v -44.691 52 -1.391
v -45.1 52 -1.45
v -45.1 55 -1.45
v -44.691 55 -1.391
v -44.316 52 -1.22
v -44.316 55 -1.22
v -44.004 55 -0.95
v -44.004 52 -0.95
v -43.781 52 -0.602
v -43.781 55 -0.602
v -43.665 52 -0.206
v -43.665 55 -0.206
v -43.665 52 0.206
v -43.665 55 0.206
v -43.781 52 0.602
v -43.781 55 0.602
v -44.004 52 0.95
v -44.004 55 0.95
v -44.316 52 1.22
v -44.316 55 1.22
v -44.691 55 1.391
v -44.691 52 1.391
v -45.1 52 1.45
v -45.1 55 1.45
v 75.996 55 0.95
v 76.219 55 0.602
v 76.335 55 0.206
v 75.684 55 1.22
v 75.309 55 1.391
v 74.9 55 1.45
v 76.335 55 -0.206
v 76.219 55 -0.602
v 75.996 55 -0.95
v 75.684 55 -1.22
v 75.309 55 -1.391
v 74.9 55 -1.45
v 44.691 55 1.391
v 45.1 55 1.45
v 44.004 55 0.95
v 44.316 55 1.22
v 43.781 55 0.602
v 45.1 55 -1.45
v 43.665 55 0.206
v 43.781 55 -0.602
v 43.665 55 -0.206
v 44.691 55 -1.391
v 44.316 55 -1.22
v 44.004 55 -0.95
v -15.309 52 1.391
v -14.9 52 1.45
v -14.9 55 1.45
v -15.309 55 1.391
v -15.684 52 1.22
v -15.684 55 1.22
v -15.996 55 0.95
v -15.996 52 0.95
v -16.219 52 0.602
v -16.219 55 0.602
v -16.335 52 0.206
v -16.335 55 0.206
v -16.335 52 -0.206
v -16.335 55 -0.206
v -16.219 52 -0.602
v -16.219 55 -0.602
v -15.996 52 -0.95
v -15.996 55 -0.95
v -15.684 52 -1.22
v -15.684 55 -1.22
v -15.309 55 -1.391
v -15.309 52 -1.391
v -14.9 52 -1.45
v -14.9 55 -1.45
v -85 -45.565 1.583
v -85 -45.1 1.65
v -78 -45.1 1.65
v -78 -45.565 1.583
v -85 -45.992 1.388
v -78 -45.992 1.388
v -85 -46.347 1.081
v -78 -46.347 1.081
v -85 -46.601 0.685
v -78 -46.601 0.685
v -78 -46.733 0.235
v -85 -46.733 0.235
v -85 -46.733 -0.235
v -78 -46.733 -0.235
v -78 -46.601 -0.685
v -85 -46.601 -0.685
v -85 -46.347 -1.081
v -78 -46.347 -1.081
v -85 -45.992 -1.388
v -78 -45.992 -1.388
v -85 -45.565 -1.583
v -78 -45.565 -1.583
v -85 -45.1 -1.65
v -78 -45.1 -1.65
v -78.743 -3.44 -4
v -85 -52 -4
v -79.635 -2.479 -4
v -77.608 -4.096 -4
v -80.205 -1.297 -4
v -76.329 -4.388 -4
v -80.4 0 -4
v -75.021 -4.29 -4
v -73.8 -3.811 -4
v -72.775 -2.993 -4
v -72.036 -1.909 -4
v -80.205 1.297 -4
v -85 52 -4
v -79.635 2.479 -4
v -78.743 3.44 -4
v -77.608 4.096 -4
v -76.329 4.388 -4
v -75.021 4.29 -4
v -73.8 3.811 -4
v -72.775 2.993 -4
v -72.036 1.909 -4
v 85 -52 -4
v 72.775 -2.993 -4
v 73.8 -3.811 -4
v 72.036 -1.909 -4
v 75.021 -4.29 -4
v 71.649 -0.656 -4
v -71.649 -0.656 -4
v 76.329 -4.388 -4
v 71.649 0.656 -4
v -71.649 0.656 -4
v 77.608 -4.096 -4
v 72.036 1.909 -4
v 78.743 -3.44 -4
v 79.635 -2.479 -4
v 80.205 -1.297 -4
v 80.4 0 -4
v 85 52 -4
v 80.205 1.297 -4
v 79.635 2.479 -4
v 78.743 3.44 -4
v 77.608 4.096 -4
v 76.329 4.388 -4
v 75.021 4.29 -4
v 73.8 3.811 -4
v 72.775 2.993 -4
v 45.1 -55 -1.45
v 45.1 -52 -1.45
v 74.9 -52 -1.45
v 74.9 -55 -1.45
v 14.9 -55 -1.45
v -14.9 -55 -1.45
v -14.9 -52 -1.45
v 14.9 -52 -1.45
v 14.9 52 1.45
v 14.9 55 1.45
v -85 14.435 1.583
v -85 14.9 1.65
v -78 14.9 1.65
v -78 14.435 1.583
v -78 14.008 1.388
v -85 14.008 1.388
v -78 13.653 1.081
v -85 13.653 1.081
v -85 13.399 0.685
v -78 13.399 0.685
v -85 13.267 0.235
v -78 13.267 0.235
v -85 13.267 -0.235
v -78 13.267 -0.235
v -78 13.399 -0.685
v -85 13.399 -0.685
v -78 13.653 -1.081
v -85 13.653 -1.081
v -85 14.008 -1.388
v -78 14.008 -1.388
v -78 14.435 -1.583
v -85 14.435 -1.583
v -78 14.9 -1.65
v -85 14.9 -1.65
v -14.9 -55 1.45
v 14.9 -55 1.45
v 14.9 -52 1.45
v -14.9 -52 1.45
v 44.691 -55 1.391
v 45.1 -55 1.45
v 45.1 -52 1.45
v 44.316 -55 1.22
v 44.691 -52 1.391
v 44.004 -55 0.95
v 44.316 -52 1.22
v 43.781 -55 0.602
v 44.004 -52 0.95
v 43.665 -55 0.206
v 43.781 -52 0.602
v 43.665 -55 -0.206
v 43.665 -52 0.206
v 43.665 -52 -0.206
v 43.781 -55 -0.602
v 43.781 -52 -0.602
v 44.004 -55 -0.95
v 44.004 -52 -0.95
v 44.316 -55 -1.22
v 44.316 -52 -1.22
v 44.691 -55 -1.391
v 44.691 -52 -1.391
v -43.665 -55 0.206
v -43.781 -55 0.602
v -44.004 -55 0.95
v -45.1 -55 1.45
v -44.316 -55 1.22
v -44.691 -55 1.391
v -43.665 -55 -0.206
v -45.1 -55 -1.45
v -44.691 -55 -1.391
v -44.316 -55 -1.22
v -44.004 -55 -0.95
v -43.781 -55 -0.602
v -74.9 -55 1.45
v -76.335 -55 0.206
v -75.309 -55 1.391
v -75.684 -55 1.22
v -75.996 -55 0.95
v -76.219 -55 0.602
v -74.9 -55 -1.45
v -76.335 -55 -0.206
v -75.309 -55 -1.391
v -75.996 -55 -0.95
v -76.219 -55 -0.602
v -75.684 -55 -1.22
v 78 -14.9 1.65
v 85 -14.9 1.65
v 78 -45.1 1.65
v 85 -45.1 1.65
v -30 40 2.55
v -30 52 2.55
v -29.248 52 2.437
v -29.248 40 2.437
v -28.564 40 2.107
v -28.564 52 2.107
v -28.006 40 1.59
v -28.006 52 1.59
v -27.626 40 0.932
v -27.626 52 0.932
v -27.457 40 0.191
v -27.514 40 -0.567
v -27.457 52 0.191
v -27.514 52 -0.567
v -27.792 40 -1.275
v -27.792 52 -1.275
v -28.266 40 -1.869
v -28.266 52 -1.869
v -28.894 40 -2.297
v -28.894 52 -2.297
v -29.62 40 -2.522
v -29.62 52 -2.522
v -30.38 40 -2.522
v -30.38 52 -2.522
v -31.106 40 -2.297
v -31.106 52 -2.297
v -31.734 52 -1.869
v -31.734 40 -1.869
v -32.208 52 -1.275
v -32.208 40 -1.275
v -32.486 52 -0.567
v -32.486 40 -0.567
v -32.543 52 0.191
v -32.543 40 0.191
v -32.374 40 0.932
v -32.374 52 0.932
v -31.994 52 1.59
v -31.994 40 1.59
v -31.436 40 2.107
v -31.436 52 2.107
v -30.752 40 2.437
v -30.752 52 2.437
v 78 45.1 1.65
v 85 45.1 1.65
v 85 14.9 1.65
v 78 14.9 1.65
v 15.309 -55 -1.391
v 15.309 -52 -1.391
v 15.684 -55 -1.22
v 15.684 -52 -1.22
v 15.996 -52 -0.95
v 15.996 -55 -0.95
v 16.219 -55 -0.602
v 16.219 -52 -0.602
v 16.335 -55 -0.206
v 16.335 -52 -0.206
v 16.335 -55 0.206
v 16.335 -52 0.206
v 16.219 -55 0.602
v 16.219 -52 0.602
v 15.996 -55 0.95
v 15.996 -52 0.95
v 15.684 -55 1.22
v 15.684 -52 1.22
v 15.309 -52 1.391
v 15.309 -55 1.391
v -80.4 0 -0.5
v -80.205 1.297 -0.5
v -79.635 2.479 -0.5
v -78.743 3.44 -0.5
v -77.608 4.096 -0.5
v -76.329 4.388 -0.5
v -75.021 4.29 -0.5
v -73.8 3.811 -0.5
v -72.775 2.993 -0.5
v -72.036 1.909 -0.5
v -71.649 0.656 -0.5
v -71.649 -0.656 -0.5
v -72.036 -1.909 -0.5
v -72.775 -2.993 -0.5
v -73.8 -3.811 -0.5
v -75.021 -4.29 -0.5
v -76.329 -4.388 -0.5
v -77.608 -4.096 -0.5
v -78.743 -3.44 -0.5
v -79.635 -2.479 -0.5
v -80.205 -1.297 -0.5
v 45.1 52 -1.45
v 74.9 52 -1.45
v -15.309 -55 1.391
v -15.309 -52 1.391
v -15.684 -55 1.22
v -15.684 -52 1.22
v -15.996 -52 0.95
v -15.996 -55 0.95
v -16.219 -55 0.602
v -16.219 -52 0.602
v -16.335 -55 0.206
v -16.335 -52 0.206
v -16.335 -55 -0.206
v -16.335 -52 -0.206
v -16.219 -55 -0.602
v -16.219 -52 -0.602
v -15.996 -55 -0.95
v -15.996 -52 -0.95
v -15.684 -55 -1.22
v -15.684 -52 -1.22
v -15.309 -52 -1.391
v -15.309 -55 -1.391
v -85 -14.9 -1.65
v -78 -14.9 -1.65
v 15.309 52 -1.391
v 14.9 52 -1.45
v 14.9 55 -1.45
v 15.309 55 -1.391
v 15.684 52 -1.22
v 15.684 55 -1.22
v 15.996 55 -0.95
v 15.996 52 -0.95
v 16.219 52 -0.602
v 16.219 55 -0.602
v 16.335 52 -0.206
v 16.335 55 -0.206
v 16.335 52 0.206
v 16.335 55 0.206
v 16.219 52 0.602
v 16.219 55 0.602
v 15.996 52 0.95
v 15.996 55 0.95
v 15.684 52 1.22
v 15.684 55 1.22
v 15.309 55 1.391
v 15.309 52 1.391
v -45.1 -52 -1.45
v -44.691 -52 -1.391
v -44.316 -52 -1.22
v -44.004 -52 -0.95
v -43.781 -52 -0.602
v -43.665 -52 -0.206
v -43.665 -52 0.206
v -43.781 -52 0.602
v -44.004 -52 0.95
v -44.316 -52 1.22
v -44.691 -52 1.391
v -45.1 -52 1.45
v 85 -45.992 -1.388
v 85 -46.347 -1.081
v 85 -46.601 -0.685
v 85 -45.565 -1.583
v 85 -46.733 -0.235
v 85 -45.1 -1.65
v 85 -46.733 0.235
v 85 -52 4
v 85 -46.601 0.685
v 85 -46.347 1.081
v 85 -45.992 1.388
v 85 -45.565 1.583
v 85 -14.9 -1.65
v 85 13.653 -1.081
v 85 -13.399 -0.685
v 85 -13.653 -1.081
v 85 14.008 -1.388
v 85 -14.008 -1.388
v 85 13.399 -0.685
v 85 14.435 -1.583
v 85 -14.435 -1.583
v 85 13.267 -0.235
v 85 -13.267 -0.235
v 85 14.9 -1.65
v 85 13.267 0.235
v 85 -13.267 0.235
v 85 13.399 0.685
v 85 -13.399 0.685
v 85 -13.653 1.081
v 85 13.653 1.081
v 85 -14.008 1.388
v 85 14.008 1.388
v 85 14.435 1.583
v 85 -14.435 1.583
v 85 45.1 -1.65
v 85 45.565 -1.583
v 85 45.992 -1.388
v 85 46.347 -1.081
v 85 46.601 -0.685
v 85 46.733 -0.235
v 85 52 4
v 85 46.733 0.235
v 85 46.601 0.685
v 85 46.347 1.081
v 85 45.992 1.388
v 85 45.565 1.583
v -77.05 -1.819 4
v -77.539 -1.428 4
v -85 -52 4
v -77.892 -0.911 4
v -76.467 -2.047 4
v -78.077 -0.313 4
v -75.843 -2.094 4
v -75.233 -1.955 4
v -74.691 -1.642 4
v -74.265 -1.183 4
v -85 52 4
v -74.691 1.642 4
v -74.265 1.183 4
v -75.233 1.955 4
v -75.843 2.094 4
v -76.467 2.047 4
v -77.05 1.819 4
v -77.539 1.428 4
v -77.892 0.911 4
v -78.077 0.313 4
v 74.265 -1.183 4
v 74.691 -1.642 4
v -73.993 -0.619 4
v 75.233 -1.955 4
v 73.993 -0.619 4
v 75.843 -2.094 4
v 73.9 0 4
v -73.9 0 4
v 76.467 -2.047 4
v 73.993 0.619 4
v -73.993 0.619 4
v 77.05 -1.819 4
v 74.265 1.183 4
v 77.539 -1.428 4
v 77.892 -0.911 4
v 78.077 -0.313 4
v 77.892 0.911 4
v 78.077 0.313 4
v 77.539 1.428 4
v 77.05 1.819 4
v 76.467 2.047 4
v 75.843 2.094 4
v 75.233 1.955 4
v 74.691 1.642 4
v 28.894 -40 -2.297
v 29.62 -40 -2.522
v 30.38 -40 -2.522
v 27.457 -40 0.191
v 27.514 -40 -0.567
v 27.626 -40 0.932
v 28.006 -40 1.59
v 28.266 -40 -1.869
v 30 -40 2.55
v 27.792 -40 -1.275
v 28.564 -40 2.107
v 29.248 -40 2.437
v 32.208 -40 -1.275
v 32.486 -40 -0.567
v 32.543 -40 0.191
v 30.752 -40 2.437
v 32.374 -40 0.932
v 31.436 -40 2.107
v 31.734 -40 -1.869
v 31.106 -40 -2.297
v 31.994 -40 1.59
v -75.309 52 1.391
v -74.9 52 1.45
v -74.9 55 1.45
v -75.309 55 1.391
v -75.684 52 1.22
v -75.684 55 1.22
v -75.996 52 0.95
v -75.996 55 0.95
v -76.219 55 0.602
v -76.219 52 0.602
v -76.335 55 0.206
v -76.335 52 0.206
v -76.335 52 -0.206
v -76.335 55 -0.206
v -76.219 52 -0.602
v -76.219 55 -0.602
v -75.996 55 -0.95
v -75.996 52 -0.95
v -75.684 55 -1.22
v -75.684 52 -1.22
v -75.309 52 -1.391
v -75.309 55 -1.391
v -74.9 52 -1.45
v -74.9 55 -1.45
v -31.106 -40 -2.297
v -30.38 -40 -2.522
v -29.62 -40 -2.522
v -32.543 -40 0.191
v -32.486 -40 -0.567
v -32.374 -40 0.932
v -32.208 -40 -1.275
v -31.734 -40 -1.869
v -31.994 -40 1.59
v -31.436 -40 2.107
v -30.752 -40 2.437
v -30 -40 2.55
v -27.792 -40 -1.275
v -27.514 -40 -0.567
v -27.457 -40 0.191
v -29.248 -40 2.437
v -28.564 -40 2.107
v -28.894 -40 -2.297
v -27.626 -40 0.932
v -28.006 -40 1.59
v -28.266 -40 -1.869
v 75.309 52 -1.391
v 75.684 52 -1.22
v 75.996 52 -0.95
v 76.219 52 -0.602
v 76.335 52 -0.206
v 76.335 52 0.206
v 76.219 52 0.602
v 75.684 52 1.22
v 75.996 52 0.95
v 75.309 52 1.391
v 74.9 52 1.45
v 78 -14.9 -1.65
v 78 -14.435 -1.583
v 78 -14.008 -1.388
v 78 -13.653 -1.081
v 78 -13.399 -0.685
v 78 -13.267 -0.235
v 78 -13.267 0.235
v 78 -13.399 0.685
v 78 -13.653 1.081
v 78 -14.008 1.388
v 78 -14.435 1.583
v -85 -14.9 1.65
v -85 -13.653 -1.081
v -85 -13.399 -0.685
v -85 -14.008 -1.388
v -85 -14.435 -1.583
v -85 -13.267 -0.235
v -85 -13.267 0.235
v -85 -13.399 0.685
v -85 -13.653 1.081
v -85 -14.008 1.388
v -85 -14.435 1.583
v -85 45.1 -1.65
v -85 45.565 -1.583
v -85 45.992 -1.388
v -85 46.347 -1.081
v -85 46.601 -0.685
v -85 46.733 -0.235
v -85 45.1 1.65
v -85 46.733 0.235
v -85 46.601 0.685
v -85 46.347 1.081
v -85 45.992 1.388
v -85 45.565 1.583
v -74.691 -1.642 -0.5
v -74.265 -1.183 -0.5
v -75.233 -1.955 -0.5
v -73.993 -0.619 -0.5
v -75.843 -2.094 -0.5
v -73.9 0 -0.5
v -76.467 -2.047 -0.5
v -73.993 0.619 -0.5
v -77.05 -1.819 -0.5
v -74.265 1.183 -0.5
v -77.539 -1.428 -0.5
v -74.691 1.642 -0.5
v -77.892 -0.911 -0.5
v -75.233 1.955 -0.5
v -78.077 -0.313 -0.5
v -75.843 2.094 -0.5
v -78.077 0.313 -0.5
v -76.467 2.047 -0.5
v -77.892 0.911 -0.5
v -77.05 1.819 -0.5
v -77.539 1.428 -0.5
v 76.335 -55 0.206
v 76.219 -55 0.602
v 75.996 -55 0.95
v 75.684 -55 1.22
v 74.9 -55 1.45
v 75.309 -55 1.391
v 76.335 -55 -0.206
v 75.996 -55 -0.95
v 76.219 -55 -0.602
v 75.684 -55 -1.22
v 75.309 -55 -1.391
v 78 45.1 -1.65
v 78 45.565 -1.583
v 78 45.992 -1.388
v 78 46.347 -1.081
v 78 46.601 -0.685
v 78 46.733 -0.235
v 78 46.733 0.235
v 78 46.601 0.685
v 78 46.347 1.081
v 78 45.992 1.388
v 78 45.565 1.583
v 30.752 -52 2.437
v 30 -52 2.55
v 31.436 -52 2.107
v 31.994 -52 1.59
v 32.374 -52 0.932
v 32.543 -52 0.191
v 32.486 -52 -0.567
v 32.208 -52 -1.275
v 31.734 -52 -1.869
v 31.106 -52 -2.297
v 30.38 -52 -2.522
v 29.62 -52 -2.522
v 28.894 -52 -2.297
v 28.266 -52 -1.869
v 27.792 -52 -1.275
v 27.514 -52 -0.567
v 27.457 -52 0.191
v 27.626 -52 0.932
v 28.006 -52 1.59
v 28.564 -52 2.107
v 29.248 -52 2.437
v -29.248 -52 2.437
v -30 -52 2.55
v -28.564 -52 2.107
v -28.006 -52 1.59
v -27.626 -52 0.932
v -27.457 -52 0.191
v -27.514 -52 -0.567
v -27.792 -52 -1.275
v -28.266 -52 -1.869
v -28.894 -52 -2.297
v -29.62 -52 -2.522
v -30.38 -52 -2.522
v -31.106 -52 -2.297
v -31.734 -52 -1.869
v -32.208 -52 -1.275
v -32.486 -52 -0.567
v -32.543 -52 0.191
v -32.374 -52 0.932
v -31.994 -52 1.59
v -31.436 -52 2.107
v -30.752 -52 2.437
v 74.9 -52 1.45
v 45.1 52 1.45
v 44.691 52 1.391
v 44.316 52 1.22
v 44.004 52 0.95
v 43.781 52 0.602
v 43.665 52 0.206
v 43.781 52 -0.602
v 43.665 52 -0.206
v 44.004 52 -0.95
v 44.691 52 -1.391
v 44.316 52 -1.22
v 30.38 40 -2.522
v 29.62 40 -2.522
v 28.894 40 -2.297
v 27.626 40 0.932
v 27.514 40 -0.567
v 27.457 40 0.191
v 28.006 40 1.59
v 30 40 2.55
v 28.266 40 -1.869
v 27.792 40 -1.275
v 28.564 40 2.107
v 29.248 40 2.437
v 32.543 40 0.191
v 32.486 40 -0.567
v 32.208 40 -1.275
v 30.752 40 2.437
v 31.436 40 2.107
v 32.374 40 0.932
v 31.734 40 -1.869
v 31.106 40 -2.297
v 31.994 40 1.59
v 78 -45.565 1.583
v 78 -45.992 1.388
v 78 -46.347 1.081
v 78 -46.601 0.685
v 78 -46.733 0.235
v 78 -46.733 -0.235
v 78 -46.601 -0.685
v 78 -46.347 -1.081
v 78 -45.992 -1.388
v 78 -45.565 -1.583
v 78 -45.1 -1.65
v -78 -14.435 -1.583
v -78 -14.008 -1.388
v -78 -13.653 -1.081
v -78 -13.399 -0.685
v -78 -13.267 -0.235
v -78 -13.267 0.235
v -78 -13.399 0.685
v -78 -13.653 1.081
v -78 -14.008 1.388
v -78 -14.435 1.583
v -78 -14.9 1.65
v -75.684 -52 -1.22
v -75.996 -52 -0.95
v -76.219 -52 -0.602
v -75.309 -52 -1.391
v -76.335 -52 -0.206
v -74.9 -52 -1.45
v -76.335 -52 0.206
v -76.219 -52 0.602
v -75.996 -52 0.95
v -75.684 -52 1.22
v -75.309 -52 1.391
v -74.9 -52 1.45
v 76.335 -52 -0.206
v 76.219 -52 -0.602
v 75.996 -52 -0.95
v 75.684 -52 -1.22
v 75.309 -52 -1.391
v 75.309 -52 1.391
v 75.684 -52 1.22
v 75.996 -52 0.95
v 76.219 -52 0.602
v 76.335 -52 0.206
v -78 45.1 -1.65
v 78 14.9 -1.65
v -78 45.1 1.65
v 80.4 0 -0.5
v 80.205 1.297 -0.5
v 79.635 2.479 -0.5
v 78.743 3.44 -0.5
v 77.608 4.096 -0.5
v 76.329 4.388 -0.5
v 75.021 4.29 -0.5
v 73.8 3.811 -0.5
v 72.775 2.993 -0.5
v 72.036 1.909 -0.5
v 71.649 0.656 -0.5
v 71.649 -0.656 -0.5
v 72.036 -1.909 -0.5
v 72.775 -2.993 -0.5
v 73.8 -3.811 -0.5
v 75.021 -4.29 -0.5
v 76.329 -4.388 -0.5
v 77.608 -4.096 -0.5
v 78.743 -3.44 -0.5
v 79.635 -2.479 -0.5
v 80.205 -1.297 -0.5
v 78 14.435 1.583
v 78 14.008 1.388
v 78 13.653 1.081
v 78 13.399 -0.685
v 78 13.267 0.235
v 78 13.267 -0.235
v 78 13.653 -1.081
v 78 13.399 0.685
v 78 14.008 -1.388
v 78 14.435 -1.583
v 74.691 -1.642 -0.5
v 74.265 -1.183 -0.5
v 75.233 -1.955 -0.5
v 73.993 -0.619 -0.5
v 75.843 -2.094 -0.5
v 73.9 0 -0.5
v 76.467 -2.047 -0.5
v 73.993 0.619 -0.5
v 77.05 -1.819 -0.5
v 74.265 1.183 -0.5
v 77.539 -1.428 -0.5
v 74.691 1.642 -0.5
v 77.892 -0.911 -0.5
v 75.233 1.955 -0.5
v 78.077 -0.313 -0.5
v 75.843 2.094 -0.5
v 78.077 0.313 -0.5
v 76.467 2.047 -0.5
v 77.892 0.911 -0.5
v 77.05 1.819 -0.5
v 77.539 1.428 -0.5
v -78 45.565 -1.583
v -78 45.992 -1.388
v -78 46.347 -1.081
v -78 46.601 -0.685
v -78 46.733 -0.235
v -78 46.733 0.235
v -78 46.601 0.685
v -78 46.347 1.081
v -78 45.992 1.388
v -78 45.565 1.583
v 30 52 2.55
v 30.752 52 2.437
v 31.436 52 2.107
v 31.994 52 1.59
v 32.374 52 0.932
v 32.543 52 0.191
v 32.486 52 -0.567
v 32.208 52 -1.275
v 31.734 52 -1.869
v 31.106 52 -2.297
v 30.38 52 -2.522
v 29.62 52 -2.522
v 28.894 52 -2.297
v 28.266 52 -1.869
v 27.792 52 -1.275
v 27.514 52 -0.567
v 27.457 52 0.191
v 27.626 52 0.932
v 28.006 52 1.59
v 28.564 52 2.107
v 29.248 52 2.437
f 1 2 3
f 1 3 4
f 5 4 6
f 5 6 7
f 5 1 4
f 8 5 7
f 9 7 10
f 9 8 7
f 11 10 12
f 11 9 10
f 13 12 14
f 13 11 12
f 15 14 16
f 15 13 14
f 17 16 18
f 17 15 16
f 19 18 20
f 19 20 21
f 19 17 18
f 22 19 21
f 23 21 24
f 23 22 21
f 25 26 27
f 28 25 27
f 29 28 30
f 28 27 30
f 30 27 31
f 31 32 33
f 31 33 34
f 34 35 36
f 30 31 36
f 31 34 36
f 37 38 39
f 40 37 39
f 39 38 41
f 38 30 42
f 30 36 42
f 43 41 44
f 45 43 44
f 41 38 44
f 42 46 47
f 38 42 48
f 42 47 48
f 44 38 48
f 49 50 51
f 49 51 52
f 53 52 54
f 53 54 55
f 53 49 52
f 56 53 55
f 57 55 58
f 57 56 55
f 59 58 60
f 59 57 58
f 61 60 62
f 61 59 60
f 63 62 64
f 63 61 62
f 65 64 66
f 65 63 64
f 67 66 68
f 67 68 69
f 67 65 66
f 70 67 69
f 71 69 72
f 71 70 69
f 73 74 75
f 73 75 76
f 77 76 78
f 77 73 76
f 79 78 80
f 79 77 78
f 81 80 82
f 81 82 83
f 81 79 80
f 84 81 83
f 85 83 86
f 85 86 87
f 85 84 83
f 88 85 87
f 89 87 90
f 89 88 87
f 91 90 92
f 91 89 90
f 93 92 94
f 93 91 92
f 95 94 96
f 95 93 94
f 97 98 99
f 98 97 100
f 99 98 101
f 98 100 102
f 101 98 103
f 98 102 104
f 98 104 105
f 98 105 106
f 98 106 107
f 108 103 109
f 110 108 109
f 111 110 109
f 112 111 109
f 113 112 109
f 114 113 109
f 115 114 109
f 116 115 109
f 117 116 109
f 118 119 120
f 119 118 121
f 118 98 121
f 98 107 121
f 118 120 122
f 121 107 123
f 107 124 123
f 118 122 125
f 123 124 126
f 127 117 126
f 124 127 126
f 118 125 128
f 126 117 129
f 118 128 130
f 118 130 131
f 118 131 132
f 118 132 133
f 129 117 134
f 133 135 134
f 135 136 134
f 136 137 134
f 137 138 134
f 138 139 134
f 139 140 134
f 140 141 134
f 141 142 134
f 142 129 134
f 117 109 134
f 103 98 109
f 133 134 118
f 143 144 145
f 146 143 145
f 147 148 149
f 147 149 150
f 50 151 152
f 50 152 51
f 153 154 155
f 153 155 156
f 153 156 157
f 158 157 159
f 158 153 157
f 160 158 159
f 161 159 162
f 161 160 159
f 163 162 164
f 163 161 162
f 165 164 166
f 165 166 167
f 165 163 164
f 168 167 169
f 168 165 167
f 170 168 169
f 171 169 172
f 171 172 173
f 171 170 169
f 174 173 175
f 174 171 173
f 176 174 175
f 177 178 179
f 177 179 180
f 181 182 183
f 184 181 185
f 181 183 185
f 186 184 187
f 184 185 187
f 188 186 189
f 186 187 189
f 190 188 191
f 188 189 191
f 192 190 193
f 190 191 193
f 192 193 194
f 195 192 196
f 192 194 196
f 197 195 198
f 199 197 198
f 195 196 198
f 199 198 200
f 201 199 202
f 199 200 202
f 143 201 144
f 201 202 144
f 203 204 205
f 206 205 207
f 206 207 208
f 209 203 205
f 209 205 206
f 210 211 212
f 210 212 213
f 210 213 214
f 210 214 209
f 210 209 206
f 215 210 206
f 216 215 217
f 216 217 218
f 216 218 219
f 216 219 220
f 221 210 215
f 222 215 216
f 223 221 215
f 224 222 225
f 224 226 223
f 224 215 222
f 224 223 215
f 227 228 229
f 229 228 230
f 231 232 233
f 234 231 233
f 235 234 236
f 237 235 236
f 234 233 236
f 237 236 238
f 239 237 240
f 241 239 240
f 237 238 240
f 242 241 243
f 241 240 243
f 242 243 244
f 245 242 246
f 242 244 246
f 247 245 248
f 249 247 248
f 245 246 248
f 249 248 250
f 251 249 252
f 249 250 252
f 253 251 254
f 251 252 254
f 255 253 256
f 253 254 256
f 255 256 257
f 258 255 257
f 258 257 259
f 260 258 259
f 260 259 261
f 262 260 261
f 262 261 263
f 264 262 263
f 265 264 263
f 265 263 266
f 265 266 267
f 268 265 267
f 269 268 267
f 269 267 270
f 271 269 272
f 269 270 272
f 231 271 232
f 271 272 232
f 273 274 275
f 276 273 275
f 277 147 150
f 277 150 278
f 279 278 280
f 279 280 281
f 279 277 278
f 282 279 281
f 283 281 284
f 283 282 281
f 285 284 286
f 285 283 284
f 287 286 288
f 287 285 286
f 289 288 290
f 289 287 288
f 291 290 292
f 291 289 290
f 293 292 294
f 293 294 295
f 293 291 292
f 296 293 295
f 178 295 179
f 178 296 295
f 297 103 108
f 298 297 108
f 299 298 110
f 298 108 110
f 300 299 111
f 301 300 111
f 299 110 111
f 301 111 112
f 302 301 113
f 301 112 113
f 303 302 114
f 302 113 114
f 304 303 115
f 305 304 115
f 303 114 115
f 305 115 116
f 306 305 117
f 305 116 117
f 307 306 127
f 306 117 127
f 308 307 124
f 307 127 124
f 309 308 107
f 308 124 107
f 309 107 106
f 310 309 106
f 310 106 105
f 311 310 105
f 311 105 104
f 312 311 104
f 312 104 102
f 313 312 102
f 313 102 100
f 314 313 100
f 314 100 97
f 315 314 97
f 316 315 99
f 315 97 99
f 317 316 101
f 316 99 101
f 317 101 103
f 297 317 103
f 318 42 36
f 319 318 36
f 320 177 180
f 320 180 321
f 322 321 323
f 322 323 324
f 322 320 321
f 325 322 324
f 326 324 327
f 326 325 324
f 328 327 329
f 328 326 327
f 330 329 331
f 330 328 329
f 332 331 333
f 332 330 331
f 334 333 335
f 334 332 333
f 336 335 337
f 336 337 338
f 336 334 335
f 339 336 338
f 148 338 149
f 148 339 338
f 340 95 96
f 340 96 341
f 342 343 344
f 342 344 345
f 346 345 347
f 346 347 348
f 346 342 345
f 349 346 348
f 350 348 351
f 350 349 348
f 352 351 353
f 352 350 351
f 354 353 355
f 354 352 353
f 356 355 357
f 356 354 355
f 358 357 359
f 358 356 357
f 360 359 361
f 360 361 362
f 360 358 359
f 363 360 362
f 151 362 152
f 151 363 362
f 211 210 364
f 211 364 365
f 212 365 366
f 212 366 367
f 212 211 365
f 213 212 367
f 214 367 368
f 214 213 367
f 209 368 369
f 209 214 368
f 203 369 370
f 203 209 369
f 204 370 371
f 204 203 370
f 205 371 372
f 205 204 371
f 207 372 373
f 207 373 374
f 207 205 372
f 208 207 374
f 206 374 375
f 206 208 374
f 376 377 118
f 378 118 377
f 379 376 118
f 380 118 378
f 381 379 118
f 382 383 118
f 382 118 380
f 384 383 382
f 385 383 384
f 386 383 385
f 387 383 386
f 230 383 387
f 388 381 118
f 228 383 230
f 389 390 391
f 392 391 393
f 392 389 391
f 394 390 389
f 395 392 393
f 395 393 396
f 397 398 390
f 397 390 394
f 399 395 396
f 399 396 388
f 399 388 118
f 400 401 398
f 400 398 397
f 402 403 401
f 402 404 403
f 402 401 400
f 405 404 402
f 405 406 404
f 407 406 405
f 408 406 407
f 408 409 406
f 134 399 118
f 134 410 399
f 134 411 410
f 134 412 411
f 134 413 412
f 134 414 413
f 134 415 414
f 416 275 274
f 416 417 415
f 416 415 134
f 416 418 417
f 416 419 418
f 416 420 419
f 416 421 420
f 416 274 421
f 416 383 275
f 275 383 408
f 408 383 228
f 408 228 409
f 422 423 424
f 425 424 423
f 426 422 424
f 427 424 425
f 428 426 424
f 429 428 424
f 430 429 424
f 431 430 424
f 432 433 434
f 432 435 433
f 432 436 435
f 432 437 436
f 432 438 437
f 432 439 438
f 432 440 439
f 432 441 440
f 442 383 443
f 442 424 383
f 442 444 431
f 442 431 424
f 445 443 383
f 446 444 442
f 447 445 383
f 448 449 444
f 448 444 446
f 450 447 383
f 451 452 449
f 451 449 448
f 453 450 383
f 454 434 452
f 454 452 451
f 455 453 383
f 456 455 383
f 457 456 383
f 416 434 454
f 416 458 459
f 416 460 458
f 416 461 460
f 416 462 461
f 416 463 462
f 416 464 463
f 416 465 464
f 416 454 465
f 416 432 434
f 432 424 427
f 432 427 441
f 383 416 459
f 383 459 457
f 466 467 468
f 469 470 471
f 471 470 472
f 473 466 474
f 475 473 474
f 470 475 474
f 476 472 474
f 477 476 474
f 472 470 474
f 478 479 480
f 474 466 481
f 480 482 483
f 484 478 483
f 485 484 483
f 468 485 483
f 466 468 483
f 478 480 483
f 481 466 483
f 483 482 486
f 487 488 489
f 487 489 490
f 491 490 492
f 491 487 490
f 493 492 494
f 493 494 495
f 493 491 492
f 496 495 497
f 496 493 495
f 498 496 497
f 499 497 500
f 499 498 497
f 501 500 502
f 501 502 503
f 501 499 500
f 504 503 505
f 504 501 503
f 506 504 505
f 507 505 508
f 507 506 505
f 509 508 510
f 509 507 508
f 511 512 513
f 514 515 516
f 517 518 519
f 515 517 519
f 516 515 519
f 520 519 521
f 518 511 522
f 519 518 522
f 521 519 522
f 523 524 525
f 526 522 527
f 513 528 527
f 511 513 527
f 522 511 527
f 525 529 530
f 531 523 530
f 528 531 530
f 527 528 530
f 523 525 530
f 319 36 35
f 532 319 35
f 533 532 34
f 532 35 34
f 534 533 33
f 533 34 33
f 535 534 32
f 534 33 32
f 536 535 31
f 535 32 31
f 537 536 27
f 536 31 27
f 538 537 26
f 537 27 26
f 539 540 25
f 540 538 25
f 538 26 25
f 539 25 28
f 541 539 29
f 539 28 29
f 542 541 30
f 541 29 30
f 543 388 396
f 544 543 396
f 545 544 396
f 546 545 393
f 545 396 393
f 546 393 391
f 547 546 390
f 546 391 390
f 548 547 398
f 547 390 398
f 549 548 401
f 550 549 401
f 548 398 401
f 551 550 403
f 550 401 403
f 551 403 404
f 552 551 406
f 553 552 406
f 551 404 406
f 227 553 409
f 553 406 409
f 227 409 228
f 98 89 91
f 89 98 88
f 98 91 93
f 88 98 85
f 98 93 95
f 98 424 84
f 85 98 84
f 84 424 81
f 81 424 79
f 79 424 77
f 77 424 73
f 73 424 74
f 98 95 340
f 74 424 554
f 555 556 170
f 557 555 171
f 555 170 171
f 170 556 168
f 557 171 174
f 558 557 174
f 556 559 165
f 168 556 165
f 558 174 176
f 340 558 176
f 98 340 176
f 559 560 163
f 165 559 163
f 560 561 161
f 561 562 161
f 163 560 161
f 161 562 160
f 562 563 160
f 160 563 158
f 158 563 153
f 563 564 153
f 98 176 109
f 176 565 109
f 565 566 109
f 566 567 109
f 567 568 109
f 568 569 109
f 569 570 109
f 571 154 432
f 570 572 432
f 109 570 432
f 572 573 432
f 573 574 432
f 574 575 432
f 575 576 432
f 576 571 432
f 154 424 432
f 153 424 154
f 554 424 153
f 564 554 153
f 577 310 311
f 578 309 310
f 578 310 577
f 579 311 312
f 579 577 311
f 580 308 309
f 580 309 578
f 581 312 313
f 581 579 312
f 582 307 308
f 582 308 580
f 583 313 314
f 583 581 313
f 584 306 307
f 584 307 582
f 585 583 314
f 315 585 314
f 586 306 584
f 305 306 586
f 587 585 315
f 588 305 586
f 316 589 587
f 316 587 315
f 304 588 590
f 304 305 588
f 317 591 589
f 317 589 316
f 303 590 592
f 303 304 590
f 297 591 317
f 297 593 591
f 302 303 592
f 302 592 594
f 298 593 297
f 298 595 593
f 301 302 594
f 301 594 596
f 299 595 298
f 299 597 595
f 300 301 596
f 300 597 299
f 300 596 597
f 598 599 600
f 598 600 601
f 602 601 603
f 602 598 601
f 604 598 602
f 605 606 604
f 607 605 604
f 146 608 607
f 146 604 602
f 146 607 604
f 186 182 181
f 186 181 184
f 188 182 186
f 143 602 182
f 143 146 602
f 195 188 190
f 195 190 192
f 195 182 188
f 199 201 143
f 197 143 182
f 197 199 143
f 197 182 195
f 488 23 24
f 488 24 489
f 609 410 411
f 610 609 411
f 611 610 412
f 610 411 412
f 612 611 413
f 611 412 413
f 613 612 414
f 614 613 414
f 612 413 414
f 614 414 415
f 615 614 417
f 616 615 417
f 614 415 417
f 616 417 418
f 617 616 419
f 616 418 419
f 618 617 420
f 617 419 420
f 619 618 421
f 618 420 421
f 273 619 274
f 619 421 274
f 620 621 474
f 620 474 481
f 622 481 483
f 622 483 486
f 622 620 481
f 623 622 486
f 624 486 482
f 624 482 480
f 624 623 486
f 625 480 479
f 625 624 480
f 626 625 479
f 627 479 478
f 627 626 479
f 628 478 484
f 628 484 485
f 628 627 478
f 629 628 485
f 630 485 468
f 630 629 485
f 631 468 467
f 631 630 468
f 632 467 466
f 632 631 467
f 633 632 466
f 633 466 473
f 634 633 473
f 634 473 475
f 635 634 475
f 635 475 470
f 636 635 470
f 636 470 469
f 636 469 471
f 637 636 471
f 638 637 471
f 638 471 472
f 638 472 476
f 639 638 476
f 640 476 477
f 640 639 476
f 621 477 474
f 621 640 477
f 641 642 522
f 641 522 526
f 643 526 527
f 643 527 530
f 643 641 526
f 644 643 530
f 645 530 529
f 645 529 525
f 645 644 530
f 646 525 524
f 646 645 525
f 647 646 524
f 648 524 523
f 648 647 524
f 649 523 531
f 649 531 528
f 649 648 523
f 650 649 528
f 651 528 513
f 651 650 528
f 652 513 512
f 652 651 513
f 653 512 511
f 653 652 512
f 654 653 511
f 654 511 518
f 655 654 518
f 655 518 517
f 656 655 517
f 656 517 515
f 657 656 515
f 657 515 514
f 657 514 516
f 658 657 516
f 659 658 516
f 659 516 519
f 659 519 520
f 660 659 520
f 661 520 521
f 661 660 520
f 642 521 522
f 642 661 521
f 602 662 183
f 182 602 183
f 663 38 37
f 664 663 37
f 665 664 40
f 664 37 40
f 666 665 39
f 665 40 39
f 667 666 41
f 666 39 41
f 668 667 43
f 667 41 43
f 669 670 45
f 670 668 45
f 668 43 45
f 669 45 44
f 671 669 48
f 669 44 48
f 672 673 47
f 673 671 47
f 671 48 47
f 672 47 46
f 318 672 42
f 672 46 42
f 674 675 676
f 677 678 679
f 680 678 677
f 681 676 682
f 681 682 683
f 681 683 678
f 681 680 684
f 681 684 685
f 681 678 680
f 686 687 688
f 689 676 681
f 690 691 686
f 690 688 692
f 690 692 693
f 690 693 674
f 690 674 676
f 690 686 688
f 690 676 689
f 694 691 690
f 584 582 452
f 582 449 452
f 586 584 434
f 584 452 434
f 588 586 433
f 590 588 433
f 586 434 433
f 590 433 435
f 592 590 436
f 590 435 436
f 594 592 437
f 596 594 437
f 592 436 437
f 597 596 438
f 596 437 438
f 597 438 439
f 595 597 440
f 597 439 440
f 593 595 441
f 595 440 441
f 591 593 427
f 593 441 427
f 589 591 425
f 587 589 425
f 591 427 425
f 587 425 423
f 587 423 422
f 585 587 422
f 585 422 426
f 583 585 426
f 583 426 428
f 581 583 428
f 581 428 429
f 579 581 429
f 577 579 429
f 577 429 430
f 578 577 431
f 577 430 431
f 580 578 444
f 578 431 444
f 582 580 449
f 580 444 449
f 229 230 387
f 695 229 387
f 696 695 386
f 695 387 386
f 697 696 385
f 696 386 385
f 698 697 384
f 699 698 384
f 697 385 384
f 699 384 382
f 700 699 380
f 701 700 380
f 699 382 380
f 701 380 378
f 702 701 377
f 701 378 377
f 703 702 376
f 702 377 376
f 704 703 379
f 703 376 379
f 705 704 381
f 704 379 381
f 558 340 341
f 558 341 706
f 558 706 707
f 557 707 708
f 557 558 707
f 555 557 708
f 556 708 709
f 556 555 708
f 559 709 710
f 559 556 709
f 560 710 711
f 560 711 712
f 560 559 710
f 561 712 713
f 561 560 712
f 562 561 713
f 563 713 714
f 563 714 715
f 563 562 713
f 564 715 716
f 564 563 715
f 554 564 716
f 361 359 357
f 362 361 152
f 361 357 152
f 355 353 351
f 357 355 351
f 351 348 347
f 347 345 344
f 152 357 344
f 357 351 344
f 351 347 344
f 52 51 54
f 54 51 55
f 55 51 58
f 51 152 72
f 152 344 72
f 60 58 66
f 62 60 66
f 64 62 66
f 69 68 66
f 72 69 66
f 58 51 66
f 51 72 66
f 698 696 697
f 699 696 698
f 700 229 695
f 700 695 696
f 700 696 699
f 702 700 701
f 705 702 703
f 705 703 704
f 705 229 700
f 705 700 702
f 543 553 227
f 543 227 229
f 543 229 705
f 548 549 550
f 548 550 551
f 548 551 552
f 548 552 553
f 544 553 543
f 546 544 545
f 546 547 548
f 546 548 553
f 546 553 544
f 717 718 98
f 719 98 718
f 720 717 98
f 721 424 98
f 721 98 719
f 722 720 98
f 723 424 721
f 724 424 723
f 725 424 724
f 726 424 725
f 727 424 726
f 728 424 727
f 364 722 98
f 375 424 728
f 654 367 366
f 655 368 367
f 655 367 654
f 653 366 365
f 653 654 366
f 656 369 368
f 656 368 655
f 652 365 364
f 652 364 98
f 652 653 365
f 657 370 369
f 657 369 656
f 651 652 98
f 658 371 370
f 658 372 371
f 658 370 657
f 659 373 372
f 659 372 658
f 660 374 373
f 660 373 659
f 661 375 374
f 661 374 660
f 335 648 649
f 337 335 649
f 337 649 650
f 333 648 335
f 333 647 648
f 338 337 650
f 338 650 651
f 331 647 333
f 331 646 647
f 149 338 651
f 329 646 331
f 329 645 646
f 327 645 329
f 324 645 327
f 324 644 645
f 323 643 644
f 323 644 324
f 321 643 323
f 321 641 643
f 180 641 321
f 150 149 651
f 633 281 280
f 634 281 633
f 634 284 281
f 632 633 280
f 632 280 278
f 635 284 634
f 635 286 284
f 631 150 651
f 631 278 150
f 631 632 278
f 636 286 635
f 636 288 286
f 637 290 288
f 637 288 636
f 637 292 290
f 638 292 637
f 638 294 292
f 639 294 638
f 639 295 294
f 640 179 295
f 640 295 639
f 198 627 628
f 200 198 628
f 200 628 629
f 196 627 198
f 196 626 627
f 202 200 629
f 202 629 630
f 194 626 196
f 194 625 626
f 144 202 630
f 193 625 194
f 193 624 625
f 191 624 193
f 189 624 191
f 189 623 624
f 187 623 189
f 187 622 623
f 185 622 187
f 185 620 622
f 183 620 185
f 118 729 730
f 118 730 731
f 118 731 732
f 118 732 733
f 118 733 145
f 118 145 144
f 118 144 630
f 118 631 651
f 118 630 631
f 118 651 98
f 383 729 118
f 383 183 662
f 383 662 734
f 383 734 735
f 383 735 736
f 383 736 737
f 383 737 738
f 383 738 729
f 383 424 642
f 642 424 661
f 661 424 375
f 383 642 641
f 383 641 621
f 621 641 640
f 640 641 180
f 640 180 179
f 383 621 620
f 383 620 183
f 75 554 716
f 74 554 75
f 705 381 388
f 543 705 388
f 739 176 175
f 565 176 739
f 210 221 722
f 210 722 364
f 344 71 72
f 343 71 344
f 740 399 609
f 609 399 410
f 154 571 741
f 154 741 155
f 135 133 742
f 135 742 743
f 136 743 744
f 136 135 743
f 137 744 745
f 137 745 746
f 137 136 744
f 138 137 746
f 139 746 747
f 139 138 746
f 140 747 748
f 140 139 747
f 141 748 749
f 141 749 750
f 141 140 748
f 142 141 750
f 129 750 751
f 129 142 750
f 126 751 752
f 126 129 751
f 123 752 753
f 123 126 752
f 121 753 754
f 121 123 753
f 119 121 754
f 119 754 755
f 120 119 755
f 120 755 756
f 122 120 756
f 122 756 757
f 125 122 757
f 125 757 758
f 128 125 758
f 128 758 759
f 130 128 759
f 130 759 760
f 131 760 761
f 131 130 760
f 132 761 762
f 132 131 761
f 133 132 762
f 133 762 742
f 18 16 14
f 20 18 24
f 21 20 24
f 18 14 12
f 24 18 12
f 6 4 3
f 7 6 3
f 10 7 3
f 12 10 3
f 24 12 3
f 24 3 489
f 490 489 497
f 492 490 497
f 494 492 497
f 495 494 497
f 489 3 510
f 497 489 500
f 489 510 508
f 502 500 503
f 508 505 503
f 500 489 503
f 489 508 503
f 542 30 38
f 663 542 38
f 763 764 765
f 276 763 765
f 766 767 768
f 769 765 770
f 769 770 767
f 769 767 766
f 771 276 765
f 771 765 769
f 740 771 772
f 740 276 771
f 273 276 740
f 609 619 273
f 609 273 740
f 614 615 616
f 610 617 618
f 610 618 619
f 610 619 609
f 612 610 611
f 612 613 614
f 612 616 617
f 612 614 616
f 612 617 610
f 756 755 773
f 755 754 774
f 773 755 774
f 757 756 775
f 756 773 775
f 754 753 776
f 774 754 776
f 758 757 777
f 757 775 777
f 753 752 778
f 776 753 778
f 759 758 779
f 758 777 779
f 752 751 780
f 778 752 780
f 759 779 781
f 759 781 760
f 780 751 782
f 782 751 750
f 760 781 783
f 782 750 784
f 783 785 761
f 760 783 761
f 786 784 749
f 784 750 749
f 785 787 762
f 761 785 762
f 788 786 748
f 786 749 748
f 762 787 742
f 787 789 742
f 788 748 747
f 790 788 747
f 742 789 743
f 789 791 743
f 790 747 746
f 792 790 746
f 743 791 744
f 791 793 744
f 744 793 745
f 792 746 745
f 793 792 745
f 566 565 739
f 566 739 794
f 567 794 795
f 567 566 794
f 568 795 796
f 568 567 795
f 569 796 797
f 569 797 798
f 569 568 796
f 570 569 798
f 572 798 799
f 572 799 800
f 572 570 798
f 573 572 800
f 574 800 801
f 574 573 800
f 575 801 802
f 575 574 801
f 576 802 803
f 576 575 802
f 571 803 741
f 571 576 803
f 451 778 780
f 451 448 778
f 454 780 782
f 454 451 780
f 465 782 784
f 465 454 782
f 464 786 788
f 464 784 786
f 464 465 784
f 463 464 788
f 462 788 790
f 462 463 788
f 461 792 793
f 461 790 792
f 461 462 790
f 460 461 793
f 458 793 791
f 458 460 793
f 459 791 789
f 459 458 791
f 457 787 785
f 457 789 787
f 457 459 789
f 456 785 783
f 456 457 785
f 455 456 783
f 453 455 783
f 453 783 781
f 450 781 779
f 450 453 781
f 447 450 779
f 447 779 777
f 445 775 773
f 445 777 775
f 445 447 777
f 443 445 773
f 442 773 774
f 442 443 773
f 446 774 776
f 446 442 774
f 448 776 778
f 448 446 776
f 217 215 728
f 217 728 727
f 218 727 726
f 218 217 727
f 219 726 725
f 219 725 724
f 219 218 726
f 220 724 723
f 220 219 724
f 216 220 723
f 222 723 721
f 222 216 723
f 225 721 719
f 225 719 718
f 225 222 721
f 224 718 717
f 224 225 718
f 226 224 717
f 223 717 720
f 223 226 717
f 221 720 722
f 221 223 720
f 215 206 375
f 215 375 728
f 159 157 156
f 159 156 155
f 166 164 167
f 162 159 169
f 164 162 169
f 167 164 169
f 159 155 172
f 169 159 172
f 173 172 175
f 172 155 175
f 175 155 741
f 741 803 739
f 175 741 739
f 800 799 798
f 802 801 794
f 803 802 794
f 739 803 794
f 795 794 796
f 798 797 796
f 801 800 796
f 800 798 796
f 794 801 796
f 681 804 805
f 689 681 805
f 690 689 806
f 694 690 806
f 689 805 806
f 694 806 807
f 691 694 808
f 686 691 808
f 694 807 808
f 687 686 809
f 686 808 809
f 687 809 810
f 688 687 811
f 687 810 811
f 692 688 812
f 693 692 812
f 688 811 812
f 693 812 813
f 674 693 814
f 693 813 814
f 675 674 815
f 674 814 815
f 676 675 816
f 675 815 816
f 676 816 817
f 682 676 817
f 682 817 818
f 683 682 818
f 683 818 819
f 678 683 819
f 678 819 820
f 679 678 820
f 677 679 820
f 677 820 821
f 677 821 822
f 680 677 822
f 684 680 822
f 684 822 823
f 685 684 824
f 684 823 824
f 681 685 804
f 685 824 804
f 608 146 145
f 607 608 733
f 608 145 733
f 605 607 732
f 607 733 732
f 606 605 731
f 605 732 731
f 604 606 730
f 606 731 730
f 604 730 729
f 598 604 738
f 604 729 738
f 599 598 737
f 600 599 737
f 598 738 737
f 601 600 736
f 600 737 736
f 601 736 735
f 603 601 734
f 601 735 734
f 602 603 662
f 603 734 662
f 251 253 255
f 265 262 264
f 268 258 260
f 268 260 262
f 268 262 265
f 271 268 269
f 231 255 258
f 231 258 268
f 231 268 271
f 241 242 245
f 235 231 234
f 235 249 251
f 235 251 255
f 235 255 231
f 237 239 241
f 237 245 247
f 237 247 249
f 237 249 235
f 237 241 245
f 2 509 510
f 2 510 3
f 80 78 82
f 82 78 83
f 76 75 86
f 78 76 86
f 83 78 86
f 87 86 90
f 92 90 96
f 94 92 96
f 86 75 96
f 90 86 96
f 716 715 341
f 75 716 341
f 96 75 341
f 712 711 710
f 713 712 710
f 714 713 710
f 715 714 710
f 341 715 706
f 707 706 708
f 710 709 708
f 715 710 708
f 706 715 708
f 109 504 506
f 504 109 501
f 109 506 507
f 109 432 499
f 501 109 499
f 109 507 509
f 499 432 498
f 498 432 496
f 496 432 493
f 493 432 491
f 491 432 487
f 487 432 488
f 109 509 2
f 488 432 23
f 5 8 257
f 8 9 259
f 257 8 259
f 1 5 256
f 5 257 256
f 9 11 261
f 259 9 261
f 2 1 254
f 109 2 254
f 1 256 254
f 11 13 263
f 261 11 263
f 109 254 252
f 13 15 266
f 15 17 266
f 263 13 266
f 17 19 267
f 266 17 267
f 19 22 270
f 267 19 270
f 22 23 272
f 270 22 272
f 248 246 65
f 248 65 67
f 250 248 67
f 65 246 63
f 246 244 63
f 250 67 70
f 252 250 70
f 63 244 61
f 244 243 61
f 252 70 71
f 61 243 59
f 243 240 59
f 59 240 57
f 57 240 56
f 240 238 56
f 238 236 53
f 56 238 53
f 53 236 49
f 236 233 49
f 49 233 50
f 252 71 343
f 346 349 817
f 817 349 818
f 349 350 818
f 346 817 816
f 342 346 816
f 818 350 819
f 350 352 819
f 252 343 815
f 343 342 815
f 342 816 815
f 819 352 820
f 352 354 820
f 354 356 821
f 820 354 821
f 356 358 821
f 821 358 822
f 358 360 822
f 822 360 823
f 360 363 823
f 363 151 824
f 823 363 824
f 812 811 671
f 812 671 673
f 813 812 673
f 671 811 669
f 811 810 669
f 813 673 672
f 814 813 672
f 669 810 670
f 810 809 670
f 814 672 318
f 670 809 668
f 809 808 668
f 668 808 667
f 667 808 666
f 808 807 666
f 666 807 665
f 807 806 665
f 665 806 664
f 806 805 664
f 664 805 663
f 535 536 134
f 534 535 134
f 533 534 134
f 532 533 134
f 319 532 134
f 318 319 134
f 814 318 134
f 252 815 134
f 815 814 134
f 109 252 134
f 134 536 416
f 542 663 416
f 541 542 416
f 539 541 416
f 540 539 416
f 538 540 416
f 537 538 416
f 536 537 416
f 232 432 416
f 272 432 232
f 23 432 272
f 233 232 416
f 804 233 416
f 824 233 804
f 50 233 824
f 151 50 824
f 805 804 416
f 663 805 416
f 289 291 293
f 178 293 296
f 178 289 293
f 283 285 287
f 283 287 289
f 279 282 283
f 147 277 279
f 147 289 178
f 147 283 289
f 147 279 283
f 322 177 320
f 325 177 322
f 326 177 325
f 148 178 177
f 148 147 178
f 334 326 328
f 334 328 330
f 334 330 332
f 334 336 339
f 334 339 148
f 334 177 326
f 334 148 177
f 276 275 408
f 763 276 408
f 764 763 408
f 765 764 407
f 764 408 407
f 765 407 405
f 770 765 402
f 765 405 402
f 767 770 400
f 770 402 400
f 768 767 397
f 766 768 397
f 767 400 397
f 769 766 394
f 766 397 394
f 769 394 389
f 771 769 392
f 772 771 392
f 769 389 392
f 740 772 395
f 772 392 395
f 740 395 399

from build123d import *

# Parameters (mm, degrees)
IZIM1_W                     = 170
IZIM1_H                     = 104
Y_KSEKLIK_EKSTR_ZYON1_DEPTH = 4
Y_KSEKLIK_EKSTR_ZYON2_DEPTH = 55
IZIM3_R                     = 2.55
KES_EKSTR_ZYON1_DEPTH       = 12
KES_EKSTR_ZYON2_DEPTH       = 7
IZIM5_R                     = 2.1
KES_EKSTR_ZYON3_DEPTH       = 5
IZIM7_R                     = 4.4
KES_EKSTR_ZYON5_DEPTH       = 3.5


with BuildPart() as part:
    # Çizim1 → Yükseklik-Ekstrüzyon1 (new, symmetric)
    with BuildSketch(Plane.XY):
        Rectangle(IZIM1_W, IZIM1_H)
    extrude(amount=Y_KSEKLIK_EKSTR_ZYON1_DEPTH, both=True)

    # Çizim2 → Yükseklik-Ekstrüzyon2 (add, symmetric)
    with BuildSketch(Plane(origin=(0, 0, 0), x_dir=(1, 0, 0), z_dir=(0, 1, 0))):
        with BuildLine():
            Line((-74.9, 1.45), (-45.1, 1.45))
            ThreePointArc((-45.1, 1.45), (-43.65, 0), (-45.1, -1.45))
            Line((-45.1, -1.45), (-74.9, -1.45))
            ThreePointArc((-74.9, -1.45), (-76.35, 0), (-74.9, 1.45))
        make_face()
        with BuildLine():
            Line((-14.9, 1.45), (14.9, 1.45))
            ThreePointArc((14.9, 1.45), (16.35, 0), (14.9, -1.45))
            Line((14.9, -1.45), (-14.9, -1.45))
            ThreePointArc((-14.9, -1.45), (-16.35, 0), (-14.9, 1.45))
        make_face()
        with BuildLine():
            Line((45.1, 1.45), (74.9, 1.45))
            ThreePointArc((74.9, 1.45), (76.35, 0), (74.9, -1.45))
            Line((74.9, -1.45), (45.1, -1.45))
            ThreePointArc((45.1, -1.45), (43.65, 0), (45.1, 1.45))
        make_face()
    extrude(amount=Y_KSEKLIK_EKSTR_ZYON2_DEPTH, both=True)

    # Çizim3 → Kes-Ekstrüzyon1 (cut)
    with BuildSketch(Plane(origin=(0, 52, 0), x_dir=(1, 0, 0), z_dir=(0, 1, 0))):
        with Locations(Location((-30, 0, 0), (0, 0, 270))):
            Circle(IZIM3_R)
        with Locations(Location((30, 0, 0), (0, 0, 270))):
            Circle(IZIM3_R)
    kes_ekstr_zyon1 = extrude(amount=-KES_EKSTR_ZYON1_DEPTH, mode=Mode.SUBTRACT)

    # Aynalama1: Kes-Ekstrüzyon1 across plane
    add(kes_ekstr_zyon1.mirror(Plane.ZX), mode=Mode.SUBTRACT)

    # Çizim4 → Kes-Ekstrüzyon2 (cut)
    with BuildSketch(Plane.ZY.offset(85)):
        with BuildLine():
            Line((-1.65, -45.1), (-1.65, -14.9))
            ThreePointArc((-1.65, -14.9), (0, -13.25), (1.65, -14.9))
            Line((1.65, -14.9), (1.65, -45.1))
            ThreePointArc((1.65, -45.1), (0, -46.75), (-1.65, -45.1))
        make_face()
        with BuildLine():
            Line((-1.65, 14.9), (-1.65, 45.1))
            ThreePointArc((-1.65, 45.1), (0, 46.75), (1.65, 45.1))
            Line((1.65, 45.1), (1.65, 14.9))
            ThreePointArc((1.65, 14.9), (0, 13.25), (-1.65, 14.9))
        make_face()
    kes_ekstr_zyon2 = extrude(amount=-KES_EKSTR_ZYON2_DEPTH, mode=Mode.SUBTRACT)

    # Çizim5 → Kes-Ekstrüzyon3 (cut, symmetric)
    with BuildSketch(Plane.XY):
        with Locations((-76, 0)):
            Circle(IZIM5_R)
    kes_ekstr_zyon3 = extrude(amount=KES_EKSTR_ZYON3_DEPTH, both=True, mode=Mode.SUBTRACT)

    # Çizim7 → Kes-Ekstrüzyon5 (cut)
    with BuildSketch(Plane(origin=(0, 0, -4), x_dir=(-1, 0, 0), z_dir=(0, 0, -1))):
        with Locations((76, 0)):
            Circle(IZIM7_R)
    kes_ekstr_zyon5 = extrude(amount=-KES_EKSTR_ZYON5_DEPTH, mode=Mode.SUBTRACT)

    # Aynalama2: Kes-Ekstrüzyon2, Kes-Ekstrüzyon3, Kes-Ekstrüzyon5 across plane
    add(kes_ekstr_zyon2.mirror(Plane(origin=(0, 0, 0), x_dir=(0, 0, 1), z_dir=(1, 0, 0))), mode=Mode.SUBTRACT)
    add(kes_ekstr_zyon3.mirror(Plane(origin=(0, 0, 0), x_dir=(0, 0, 1), z_dir=(1, 0, 0))), mode=Mode.SUBTRACT)
    add(kes_ekstr_zyon5.mirror(Plane(origin=(0, 0, 0), x_dir=(0, 0, 1), z_dir=(1, 0, 0))), mode=Mode.SUBTRACT)


solid = part.part
